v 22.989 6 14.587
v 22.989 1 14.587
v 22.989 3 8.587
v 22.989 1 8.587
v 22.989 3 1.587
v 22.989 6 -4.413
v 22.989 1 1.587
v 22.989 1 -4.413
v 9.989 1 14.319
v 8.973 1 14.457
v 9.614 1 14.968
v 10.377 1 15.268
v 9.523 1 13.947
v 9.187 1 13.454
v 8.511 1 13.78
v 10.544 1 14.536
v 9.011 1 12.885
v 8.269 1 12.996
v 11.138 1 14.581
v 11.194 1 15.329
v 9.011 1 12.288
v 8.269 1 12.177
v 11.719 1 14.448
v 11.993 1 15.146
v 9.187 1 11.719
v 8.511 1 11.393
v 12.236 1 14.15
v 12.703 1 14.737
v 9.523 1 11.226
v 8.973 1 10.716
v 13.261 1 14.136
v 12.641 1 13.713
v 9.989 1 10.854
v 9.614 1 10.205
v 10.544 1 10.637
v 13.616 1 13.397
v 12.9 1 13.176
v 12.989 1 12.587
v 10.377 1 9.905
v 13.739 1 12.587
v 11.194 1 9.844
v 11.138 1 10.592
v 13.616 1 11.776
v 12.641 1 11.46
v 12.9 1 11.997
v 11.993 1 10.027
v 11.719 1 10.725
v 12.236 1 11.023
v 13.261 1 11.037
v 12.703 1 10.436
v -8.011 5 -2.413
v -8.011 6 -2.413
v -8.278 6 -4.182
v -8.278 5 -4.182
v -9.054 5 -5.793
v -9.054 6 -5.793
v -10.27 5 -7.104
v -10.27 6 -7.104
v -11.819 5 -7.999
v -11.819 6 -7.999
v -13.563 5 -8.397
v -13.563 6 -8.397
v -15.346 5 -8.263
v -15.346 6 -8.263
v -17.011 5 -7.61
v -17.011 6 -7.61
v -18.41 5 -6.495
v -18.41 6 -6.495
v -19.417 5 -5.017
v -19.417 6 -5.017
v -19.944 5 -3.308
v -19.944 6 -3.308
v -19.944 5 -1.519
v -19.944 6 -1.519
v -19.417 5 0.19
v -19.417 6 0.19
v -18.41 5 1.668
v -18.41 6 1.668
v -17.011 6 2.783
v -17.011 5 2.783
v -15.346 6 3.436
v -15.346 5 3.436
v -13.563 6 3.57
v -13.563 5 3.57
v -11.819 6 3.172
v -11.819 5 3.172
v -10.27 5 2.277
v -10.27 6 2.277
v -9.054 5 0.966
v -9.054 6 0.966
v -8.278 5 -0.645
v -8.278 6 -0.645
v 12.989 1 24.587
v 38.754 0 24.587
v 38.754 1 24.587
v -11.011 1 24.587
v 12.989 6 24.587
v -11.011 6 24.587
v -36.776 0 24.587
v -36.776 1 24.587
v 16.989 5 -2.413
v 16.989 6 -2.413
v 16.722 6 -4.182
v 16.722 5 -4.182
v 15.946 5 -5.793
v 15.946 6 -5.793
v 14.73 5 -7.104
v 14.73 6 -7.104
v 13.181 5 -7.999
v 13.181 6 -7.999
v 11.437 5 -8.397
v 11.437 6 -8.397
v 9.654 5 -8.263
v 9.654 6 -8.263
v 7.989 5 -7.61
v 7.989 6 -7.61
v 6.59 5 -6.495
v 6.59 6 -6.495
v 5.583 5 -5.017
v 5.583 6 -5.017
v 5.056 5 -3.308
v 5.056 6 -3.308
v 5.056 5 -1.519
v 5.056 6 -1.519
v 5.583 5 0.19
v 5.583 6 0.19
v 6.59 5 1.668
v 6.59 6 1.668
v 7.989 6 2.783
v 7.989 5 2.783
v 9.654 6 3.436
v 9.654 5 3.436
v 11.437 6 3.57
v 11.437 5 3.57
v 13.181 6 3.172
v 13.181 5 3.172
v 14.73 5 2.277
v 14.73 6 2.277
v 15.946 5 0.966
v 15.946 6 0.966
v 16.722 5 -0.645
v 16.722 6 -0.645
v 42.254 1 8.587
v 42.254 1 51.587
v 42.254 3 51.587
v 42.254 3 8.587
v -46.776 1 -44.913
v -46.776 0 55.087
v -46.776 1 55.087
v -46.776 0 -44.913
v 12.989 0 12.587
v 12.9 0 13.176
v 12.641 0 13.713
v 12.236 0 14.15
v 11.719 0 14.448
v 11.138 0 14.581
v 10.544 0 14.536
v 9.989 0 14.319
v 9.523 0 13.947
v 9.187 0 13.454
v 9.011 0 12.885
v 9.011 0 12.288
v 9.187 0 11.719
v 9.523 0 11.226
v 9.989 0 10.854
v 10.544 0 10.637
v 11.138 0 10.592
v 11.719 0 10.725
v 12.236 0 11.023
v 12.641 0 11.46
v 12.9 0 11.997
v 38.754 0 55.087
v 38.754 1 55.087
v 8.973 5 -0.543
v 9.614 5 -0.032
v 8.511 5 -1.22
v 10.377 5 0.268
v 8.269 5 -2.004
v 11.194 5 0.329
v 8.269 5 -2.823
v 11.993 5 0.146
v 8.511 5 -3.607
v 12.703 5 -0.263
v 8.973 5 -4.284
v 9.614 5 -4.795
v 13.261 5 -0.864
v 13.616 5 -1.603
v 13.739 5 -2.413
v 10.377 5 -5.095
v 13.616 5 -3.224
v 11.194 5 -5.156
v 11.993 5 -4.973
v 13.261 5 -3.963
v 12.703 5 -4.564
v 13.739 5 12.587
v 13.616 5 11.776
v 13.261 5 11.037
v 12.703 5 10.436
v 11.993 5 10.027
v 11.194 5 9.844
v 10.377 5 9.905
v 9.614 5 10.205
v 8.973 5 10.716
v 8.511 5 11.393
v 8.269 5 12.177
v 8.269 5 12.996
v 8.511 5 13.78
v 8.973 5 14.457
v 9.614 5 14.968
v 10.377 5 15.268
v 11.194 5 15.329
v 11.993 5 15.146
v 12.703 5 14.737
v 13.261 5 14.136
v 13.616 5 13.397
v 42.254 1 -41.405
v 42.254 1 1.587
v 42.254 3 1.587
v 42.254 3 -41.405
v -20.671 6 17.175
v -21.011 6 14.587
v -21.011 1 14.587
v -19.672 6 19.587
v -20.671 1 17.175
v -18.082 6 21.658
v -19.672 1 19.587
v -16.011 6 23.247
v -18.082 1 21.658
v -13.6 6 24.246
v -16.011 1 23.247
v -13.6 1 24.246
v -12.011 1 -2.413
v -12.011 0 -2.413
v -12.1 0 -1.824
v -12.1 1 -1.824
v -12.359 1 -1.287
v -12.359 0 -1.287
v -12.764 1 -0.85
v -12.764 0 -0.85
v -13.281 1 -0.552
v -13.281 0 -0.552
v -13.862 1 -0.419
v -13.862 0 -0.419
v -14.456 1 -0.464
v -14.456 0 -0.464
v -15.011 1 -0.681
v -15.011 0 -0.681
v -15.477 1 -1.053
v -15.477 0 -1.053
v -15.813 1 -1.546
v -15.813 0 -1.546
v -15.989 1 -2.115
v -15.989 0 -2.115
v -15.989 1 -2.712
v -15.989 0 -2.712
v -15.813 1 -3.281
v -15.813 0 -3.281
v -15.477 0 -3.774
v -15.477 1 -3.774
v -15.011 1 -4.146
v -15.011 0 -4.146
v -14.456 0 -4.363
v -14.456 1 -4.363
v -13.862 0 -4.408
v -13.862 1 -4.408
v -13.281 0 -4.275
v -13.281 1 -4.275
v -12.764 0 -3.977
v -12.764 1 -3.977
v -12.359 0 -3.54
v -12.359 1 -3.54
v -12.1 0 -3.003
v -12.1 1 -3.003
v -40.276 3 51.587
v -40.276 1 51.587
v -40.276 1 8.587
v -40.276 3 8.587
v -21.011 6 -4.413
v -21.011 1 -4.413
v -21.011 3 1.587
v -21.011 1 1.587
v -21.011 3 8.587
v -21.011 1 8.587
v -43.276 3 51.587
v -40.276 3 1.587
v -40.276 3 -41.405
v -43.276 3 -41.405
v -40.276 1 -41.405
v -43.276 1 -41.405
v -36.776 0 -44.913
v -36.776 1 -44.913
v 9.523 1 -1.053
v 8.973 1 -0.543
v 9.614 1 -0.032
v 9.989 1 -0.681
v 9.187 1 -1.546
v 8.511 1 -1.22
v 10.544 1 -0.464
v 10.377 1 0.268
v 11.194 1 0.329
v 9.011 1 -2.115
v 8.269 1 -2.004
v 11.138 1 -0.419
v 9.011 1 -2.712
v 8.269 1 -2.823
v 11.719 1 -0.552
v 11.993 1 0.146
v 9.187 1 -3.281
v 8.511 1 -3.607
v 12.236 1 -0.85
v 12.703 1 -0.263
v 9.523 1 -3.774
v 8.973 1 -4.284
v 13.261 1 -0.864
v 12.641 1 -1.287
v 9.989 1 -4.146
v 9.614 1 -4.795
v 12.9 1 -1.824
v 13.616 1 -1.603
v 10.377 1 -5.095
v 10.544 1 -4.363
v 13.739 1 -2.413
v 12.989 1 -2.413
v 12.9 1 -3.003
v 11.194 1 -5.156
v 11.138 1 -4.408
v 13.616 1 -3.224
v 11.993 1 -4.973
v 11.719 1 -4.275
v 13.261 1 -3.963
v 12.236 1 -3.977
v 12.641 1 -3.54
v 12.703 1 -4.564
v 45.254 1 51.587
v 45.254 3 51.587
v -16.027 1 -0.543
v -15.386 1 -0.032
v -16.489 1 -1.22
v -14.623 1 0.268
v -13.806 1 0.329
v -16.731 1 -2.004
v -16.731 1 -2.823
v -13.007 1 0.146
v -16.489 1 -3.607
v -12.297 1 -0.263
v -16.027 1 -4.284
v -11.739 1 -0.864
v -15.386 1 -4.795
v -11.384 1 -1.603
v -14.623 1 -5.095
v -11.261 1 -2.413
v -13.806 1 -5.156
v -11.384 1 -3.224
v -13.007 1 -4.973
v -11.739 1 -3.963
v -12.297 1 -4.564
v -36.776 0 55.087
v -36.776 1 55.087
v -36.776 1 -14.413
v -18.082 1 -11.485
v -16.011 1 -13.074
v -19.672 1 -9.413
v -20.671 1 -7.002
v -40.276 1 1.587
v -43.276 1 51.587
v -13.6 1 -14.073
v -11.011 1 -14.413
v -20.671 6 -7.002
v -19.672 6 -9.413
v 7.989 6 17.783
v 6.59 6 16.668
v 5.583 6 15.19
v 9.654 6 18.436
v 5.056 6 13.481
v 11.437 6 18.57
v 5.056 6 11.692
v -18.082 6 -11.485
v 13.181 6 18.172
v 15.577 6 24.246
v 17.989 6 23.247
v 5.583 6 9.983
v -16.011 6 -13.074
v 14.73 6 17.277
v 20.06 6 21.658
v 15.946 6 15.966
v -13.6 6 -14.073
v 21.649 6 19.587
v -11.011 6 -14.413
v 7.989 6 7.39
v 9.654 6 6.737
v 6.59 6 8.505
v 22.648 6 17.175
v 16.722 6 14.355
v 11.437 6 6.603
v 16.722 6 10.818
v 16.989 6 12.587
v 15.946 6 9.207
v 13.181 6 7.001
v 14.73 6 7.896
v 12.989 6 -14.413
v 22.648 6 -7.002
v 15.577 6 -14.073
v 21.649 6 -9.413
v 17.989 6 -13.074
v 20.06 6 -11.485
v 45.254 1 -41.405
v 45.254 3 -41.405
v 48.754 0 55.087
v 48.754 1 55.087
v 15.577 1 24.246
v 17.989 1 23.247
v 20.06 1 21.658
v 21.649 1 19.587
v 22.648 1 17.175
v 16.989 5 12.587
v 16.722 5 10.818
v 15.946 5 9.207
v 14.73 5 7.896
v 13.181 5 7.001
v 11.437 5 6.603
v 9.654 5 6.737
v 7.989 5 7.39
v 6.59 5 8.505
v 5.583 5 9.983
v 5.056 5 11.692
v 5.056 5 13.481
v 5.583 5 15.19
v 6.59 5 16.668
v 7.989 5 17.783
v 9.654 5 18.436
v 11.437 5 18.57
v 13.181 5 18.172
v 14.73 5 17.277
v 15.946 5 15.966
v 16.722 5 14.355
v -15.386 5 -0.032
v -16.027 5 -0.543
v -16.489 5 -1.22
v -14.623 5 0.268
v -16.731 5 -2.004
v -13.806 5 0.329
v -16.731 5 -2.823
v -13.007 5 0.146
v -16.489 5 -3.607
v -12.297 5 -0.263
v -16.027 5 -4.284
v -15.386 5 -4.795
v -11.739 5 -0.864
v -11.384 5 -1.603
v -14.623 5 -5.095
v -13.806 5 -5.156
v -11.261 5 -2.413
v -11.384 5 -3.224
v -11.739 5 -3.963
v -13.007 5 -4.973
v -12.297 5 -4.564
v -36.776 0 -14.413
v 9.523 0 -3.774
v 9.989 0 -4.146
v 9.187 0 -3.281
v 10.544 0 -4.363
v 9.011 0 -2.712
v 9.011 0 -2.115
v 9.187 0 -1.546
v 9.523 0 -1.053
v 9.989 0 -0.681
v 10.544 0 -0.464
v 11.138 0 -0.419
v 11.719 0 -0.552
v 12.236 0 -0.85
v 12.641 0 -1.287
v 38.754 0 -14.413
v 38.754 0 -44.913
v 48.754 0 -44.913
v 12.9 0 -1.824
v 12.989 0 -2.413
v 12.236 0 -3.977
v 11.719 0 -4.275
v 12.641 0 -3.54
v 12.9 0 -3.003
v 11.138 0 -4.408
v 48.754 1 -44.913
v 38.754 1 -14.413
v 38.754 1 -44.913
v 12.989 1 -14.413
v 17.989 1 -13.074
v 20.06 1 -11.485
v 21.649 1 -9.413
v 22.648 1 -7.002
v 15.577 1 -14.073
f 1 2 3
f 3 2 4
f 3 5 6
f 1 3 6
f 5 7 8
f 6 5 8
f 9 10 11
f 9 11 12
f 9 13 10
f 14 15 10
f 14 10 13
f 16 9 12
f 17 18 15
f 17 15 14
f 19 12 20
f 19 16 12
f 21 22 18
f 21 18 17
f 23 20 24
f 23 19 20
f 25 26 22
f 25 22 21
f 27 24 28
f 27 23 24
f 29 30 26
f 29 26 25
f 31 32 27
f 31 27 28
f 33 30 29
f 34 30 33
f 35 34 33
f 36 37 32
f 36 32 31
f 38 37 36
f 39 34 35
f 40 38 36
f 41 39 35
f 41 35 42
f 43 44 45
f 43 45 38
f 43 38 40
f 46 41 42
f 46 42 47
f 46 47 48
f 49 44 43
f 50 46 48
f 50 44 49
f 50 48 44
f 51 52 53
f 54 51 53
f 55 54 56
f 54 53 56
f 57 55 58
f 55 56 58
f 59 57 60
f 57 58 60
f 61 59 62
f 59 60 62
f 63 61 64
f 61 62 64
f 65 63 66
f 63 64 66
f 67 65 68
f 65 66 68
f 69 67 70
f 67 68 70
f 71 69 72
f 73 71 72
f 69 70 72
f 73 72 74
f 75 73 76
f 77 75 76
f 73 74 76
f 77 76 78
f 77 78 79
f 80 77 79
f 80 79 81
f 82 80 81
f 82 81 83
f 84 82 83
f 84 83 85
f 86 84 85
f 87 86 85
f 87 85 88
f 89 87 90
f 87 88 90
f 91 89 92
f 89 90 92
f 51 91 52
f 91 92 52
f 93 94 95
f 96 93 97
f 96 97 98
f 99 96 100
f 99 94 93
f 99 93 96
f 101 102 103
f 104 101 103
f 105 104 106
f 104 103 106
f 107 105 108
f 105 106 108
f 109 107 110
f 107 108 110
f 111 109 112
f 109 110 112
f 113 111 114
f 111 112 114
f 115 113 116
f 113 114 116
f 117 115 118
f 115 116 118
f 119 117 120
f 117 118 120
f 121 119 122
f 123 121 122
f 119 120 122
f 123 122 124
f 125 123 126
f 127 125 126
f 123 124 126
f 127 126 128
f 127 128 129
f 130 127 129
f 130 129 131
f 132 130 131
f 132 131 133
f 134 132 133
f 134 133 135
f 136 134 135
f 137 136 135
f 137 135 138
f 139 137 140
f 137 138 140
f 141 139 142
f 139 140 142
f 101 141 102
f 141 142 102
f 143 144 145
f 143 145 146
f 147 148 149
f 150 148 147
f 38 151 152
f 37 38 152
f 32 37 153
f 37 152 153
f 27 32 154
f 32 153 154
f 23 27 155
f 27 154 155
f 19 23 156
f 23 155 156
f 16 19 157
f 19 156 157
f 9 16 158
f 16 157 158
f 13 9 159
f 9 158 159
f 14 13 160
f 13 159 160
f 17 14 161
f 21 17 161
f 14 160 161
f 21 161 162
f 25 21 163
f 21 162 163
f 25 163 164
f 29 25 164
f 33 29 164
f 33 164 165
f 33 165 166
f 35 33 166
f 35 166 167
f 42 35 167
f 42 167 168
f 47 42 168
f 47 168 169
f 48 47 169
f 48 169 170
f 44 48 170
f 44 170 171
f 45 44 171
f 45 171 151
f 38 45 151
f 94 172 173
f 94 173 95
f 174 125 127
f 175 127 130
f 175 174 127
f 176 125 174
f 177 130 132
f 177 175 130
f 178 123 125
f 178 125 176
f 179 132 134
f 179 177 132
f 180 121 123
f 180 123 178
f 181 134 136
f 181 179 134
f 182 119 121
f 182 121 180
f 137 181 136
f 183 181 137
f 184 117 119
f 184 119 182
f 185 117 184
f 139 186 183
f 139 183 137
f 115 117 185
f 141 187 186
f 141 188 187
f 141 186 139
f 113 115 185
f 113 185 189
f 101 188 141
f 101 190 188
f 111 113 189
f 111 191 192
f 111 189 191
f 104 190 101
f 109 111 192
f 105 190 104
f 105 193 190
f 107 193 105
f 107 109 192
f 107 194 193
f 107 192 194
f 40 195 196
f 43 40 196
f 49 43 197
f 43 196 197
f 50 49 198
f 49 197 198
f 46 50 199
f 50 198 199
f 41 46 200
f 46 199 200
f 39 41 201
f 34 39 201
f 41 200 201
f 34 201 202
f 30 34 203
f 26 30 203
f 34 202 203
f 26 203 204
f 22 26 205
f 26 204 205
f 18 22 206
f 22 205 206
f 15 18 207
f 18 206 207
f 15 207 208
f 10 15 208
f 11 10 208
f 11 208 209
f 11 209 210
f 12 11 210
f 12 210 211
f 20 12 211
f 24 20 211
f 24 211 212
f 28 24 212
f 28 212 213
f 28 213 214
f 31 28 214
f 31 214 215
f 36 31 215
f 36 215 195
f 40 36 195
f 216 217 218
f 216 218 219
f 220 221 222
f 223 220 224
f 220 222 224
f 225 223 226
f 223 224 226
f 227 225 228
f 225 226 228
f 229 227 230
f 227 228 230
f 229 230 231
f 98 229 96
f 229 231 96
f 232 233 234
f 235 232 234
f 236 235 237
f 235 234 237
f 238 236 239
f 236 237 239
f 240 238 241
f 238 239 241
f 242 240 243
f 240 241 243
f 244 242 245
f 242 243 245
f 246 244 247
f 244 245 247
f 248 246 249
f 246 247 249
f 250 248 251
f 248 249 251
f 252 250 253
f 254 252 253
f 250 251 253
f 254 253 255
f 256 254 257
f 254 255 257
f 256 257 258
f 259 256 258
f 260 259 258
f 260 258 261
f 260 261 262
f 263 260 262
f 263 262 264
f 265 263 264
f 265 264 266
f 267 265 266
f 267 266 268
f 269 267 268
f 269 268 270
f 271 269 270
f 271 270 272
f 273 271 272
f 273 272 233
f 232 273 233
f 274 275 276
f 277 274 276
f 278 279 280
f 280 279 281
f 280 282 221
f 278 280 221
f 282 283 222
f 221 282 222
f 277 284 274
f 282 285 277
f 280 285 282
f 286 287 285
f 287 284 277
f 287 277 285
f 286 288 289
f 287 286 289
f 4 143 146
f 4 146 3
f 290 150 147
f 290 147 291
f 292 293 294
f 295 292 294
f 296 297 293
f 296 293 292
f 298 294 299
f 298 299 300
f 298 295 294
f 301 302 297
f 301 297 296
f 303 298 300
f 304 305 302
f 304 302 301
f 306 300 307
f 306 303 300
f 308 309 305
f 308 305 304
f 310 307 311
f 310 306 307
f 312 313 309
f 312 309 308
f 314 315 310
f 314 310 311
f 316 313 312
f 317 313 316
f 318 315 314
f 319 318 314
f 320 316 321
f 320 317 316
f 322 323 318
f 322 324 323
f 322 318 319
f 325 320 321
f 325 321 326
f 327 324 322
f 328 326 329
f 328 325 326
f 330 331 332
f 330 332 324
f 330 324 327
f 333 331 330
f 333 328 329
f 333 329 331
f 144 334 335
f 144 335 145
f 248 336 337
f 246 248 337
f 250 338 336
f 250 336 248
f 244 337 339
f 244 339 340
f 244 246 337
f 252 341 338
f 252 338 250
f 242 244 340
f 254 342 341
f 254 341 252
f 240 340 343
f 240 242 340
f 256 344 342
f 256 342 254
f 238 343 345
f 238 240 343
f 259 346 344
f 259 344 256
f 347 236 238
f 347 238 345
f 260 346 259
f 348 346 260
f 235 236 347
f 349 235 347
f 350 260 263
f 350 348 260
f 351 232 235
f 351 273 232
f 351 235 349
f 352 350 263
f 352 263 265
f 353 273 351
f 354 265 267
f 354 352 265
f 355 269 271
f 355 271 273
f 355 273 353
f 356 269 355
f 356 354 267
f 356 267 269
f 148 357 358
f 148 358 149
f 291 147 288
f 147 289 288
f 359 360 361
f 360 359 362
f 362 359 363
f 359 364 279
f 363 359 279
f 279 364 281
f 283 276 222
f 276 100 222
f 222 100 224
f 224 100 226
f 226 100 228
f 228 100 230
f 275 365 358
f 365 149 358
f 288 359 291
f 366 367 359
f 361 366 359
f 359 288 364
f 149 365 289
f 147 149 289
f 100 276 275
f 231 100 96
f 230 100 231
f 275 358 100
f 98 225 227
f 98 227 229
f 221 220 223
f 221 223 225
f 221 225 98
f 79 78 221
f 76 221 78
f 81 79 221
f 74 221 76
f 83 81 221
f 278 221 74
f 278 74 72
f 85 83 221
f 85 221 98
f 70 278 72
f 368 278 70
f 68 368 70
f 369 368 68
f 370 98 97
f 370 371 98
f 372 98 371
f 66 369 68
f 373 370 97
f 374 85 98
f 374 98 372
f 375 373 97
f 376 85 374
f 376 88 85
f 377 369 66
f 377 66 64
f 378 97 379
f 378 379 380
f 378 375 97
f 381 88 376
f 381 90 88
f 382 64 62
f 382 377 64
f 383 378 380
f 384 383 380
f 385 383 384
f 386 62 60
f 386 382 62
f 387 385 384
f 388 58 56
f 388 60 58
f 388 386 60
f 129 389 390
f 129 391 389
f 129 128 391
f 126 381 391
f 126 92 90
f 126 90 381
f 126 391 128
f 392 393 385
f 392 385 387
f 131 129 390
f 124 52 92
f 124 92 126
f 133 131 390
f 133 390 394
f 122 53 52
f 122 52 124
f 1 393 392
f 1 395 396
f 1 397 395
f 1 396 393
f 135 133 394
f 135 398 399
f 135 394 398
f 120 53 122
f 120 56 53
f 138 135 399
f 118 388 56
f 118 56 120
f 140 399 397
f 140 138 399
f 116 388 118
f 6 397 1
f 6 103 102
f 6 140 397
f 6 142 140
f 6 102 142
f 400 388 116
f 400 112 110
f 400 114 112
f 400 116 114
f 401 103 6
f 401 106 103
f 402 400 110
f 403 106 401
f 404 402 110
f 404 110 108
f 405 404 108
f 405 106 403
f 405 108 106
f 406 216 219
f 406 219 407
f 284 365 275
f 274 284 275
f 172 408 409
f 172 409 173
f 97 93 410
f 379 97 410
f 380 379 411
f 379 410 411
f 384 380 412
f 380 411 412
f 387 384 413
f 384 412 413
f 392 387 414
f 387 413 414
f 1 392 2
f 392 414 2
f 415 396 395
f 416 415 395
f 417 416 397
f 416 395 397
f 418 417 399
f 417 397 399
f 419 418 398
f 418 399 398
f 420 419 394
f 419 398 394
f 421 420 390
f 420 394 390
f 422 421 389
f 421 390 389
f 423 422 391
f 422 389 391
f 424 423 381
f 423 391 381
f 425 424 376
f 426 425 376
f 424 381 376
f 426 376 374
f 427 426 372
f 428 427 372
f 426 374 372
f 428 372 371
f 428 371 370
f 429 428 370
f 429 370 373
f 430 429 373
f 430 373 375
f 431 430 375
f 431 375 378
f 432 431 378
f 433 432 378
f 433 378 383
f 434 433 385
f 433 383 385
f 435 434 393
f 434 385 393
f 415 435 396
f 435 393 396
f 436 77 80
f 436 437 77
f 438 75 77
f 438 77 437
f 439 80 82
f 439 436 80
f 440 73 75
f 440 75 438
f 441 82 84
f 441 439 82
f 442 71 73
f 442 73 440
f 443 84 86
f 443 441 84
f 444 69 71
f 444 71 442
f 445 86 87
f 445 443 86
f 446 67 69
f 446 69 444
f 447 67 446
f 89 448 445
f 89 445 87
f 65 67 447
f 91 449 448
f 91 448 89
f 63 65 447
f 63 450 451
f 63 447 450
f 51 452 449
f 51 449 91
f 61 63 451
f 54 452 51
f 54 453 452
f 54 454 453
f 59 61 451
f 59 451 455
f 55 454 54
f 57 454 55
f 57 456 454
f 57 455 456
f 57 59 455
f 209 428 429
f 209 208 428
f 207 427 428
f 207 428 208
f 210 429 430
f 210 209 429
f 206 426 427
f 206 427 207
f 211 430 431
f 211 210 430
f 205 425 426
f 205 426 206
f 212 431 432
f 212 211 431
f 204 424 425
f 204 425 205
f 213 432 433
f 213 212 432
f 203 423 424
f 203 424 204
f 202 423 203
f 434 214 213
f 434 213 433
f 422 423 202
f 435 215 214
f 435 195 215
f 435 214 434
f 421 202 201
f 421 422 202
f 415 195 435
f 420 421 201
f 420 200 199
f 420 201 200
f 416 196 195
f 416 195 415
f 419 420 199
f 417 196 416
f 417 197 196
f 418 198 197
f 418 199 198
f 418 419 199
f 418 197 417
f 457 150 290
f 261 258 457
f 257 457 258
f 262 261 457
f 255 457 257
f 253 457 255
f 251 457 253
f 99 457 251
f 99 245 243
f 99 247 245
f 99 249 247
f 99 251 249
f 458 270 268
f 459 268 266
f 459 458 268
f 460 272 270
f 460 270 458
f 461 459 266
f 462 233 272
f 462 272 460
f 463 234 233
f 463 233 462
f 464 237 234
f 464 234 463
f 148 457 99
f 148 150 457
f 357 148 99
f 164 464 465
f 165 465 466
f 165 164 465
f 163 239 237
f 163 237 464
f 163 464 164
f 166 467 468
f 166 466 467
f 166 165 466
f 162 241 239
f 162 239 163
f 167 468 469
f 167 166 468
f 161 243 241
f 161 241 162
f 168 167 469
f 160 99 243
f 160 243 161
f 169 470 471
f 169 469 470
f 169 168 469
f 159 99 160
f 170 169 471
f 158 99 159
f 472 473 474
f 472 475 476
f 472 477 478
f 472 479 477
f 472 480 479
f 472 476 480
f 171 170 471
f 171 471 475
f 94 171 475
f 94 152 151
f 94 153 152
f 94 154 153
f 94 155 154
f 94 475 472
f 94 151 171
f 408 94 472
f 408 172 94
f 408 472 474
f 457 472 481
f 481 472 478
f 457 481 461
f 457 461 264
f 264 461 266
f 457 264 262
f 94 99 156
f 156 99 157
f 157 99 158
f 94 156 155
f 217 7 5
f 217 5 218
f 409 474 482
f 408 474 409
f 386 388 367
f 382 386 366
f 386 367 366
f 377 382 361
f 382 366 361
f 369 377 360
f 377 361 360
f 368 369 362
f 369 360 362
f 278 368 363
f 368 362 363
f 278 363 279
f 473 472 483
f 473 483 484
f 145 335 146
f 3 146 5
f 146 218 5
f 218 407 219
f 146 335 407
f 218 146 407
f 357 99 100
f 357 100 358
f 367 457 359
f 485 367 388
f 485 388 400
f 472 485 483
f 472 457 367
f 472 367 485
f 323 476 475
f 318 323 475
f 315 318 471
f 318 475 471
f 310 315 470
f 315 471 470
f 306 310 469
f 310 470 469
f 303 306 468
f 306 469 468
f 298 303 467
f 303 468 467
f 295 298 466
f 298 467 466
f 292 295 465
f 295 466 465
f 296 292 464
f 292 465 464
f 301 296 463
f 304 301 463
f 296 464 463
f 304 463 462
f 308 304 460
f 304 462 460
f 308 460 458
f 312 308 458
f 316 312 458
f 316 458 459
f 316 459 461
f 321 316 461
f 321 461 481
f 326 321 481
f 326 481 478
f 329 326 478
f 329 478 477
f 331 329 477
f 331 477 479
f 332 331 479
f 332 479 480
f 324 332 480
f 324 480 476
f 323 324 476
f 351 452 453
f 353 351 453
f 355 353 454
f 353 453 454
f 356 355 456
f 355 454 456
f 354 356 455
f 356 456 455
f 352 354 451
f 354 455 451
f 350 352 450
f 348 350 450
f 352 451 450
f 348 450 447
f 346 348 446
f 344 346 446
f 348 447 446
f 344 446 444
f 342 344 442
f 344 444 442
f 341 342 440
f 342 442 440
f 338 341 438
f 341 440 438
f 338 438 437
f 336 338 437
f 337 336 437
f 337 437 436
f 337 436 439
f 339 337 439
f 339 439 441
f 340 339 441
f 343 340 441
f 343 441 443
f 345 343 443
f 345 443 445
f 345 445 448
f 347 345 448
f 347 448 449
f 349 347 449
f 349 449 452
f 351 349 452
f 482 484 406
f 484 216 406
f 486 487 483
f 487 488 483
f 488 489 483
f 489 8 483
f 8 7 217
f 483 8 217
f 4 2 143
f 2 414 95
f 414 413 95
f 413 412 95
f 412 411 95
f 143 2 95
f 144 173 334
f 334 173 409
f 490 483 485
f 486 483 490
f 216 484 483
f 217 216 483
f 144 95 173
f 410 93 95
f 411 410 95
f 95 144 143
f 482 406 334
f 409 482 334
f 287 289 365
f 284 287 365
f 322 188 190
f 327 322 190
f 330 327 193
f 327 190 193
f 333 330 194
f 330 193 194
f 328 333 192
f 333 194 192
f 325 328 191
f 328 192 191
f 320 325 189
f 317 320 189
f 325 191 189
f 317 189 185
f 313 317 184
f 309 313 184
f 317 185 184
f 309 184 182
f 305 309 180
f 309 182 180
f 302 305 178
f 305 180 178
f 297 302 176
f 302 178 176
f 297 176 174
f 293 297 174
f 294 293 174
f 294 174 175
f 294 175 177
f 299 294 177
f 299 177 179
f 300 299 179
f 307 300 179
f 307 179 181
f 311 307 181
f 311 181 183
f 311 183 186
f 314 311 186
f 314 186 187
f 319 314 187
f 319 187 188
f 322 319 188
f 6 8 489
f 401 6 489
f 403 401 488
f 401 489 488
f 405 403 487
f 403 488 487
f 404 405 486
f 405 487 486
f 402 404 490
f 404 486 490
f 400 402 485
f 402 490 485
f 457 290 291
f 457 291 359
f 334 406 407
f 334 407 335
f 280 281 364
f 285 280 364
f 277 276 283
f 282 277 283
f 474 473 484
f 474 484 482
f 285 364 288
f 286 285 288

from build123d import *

# Parameters (mm, degrees)
SKETCH1_R           = 1.75
BOSS_EXTRUDE1_DEPTH = 6
SKETCH2_R           = 2.75
CUT_EXTRUDE1_DEPTH  = 5
SKETCH3_R           = 6
CUT_EXTRUDE2_DEPTH  = 1
BOSS_EXTRUDE3_DEPTH = 1
BOSS_EXTRUDE4_DEPTH = 2
SKETCH7_R           = 2
CUT_EXTRUDE3_DEPTH  = 2


with BuildPart() as part:
    # Sketch1 → Boss-Extrude1 (new body)
    with BuildSketch(Plane(origin=(0, 0, 0), x_dir=(1, 0, 0), z_dir=(0, 1, 0))):
        with BuildLine():
            Line((-11.011362906, -24.58650519), (12.988637094, -24.58650519))
            ThreePointArc((12.988637094, -24.58650519), (20.059704906, -21.657573002), (22.988637094, -14.58650519))
            Line((22.988637094, -14.58650519), (22.988637094, 4.41349481))
            ThreePointArc((22.988637094, 4.41349481), (20.059704906, 11.484562622), (12.988637094, 14.41349481))
            Line((12.988637094, 14.41349481), (-11.011362906, 14.41349481))
            ThreePointArc((-11.011362906, 14.41349481), (-18.082430717, 11.484562622), (-21.011362906, 4.41349481))
            Line((-21.011362906, 4.41349481), (-21.011362906, -14.58650519))
            ThreePointArc((-21.011362906, -14.58650519), (-18.082430717, -21.657573002), (-11.011362906, -24.58650519))
        make_face()
        with Locations((-14.011362906, 2.41349481)):
            Circle(SKETCH1_R, mode=Mode.SUBTRACT)
        with Locations((10.988637094, 2.41349481)):
            Circle(SKETCH1_R, mode=Mode.SUBTRACT)
        with Locations((10.988637094, -12.58650519)):
            Circle(SKETCH1_R, mode=Mode.SUBTRACT)
    extrude(amount=BOSS_EXTRUDE1_DEPTH)

    # Sketch2 → Cut-Extrude1 (cut)
    with BuildSketch(Plane(origin=(0, 6, 0), x_dir=(1, 0, 0), z_dir=(0, 1, 0))):
        with Locations((-14.011362906, 2.41349481)):
            Circle(SKETCH2_R)
        with Locations((10.988637094, 2.41349481)):
            Circle(SKETCH2_R)
        with Locations((10.988637094, -12.58650519)):
            Circle(SKETCH2_R)
    extrude(amount=-CUT_EXTRUDE1_DEPTH, mode=Mode.SUBTRACT)

    # Sketch3 → Cut-Extrude2 (cut)
    with BuildSketch(Plane(origin=(0, 6, 0), x_dir=(1, 0, 0), z_dir=(0, 1, 0))):
        with Locations((10.988637094, 2.41349481)):
            Circle(SKETCH3_R)
        with Locations((10.988637094, -12.58650519)):
            Circle(SKETCH3_R)
        with Locations((-14.011362906, 2.41349481)):
            Circle(SKETCH3_R)
    extrude(amount=-CUT_EXTRUDE2_DEPTH, mode=Mode.SUBTRACT)

    # Sketch4 → Boss-Extrude3 (add)
    with BuildSketch(Plane.XZ):
        Polygon((-46.776393851, -44.91349481), (-36.776393851, -44.91349481), (-36.776393851, -14.41349481), (38.75366804, -14.41349481), (38.75366804, -44.91349481), (48.75366804, -44.91349481), (48.75366804, 55.08650519), (38.75366804, 55.08650519), (38.75366804, 24.58650519), (-36.776393851, 24.58650519), (-36.776393851, 55.08650519), (-46.776393851, 55.08650519), align=None)
    extrude(amount=-BOSS_EXTRUDE3_DEPTH)

    # Sketch6 → Boss-Extrude4 (add)
    with BuildSketch(Plane(origin=(0, 1, 0), x_dir=(1, 0, 0), z_dir=(0, 1, 0))):
        Polygon((22.988637094, -1.58650519), (42.25366804, -1.58650519), (42.25366804, 41.4051813), (45.25366804, 41.4051813), (45.25366804, -51.58650519), (42.25366804, -51.58650519), (42.25366804, -8.58650519), (22.988637094, -8.58650519), align=None)
        Polygon((-21.011362906, -8.58650519), (-21.011362906, -1.58650519), (-40.276393851, -1.58650519), (-40.276393851, 41.4051813), (-43.276393851, 41.4051813), (-43.276393851, -51.58650519), (-40.276393851, -51.58650519), (-40.276393851, -8.58650519), align=None)
    extrude(amount=BOSS_EXTRUDE4_DEPTH)

    # Sketch7 → Cut-Extrude3 (cut)
    with BuildSketch(Plane.XZ):
        with Locations((-14.011362906, -2.41349481)):
            Circle(SKETCH7_R)
        with Locations((10.988637094, -2.41349481)):
            Circle(SKETCH7_R)
        with Locations((10.988637094, 12.58650519)):
            Circle(SKETCH7_R)
    extrude(amount=-CUT_EXTRUDE3_DEPTH, mode=Mode.SUBTRACT)


solid = part.part
